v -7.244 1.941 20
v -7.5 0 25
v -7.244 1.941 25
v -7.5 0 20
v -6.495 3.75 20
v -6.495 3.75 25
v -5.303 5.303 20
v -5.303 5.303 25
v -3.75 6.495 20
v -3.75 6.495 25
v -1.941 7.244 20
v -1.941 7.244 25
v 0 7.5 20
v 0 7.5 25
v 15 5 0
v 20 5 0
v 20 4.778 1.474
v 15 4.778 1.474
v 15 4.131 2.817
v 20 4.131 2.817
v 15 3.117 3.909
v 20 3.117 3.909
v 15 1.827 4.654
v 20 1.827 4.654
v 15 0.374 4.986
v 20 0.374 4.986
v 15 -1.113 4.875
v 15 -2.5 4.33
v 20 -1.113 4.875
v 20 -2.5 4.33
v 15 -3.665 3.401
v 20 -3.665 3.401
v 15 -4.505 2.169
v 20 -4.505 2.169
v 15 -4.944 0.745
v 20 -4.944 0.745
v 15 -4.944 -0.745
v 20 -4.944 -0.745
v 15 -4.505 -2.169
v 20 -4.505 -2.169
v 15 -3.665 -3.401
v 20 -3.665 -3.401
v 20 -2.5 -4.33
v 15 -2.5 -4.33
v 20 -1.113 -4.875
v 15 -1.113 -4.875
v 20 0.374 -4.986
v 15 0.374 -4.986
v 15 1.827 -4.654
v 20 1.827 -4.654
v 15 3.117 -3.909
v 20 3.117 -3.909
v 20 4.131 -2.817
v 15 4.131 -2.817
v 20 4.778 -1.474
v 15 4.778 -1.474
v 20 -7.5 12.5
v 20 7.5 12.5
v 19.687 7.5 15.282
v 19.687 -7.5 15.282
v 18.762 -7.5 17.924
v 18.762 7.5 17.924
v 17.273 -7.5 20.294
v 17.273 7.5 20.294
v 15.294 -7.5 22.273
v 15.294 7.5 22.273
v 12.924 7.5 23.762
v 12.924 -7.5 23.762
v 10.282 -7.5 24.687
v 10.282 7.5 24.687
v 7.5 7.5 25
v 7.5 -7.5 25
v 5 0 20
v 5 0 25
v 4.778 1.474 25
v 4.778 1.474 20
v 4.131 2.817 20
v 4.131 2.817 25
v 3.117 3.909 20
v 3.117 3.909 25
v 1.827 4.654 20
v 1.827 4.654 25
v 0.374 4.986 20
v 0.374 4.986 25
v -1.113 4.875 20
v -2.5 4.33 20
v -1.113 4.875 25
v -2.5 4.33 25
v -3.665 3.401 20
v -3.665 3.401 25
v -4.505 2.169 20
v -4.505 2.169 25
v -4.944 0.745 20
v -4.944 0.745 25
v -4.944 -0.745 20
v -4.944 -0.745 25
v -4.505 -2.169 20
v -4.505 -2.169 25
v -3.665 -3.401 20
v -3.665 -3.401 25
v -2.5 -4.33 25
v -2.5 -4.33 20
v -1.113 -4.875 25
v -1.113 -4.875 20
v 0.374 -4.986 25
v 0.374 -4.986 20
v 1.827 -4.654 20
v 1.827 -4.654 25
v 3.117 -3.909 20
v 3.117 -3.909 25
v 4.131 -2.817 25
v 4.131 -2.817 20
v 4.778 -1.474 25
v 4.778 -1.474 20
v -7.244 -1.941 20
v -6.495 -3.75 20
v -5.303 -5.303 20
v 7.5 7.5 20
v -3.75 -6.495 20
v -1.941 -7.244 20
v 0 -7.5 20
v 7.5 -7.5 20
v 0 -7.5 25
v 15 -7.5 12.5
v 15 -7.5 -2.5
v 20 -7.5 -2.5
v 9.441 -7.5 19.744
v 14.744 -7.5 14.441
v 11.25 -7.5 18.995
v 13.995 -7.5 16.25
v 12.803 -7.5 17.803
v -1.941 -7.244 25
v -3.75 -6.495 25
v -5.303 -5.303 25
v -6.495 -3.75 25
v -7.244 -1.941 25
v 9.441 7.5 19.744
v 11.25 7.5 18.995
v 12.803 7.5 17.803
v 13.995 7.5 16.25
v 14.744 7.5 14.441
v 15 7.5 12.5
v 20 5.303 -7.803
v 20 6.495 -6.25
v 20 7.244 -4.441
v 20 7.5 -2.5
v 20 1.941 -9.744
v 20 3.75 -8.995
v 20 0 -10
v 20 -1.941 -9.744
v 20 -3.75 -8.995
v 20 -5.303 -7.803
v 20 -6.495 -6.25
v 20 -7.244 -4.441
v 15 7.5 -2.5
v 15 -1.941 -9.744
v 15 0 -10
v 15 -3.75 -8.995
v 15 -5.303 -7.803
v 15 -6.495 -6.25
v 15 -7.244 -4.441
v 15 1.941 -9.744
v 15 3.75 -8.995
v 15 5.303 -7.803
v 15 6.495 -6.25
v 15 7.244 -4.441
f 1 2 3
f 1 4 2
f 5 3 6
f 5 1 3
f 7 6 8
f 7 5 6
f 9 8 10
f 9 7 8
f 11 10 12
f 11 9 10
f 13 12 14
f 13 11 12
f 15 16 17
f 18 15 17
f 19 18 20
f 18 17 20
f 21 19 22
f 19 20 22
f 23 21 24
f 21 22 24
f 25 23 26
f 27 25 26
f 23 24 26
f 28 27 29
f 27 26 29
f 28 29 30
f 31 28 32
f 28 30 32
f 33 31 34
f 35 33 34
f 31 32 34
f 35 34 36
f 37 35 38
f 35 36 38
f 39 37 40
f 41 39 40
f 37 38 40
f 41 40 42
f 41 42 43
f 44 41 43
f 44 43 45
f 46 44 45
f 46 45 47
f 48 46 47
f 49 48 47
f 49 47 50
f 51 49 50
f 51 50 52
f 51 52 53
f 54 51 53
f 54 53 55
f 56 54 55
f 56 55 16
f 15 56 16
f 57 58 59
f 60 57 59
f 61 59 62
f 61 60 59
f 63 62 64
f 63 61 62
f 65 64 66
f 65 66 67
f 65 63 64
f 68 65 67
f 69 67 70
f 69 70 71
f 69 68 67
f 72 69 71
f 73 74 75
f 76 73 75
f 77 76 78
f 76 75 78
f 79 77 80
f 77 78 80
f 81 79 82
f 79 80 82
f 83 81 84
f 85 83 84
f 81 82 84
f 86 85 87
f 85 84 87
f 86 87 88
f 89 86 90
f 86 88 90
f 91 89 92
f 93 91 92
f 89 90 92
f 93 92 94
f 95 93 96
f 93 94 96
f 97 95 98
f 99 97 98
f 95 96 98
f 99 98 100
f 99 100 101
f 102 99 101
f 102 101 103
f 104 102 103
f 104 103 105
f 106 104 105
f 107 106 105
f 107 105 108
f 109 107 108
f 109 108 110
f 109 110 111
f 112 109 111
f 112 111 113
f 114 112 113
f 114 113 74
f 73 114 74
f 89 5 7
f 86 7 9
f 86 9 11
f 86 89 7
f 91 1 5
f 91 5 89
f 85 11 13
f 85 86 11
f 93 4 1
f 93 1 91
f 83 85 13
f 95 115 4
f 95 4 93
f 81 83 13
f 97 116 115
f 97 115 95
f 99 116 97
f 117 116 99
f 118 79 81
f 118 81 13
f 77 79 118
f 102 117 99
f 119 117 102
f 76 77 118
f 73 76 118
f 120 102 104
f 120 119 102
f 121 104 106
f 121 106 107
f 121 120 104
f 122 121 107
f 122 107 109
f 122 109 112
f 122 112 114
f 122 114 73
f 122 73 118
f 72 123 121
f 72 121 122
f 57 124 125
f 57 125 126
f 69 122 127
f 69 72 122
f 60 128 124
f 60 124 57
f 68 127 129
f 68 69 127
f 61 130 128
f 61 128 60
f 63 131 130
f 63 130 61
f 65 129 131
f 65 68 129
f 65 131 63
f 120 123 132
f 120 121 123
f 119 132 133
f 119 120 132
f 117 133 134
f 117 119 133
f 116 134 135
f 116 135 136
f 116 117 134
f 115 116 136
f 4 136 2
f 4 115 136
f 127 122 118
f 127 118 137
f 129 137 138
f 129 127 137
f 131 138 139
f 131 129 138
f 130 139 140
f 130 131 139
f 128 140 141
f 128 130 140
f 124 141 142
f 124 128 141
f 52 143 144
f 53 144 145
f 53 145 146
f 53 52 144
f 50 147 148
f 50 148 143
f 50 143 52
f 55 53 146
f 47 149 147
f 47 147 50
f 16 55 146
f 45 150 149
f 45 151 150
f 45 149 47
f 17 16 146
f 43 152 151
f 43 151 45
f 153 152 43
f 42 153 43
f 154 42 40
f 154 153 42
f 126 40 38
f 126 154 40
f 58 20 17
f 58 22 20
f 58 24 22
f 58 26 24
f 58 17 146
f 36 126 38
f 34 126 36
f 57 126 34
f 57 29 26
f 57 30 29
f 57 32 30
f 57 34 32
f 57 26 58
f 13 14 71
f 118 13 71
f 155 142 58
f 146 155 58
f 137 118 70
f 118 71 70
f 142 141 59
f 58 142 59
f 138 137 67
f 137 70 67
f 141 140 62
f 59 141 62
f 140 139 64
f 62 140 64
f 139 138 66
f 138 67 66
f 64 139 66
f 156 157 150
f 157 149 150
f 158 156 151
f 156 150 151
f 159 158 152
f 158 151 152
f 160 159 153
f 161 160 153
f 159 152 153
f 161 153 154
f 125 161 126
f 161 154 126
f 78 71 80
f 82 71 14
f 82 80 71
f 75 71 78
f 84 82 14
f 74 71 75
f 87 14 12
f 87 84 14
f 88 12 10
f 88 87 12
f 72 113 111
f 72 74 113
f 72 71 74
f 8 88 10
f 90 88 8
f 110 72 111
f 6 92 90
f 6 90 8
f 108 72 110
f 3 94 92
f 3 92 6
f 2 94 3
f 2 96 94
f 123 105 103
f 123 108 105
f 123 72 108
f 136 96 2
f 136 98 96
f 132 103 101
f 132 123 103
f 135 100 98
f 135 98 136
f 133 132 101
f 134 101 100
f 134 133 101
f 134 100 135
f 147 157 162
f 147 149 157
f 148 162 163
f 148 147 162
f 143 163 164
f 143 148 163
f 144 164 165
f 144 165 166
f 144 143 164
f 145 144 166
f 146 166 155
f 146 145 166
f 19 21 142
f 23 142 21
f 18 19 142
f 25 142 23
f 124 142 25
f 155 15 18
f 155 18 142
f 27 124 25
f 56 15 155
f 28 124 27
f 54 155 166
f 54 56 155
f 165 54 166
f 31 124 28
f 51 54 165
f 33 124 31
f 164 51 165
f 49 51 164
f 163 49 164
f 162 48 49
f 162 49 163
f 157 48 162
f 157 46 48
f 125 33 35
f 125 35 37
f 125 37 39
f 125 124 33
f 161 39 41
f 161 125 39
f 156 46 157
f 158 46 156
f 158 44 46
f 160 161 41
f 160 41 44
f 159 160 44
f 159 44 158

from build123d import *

# Parameters (mm, degrees)
F1_DEPTH = 7.5
F2_R     = 7.49999
F3_R     = 5
F4_DEPTH = 35.001
F5_R     = 5
F6_DEPTH = 27.501


# Not quite as in the source:
# - a fillet or chamfer is up to 0.001 mm smaller than in the source, because OpenCascade refuses the exact size


with BuildPart() as f1:
    # F0 (on Front) → F1 (new body, symmetric)
    with BuildSketch(Plane.XZ):
        with BuildLine():
            Line((7.5, 25), (-7.5, 25))
            Line((-7.5, 25), (-7.5, 20))
            Line((-7.5, 20), (7.5, 20))
            ThreePointArc((7.5, 20), (12.8033008589, 17.8033008589), (15, 12.5))
            Line((15, 12.5), (15, -10))
            Line((15, -10), (20, -10))
            Line((20, -10), (20, 12.5))
            ThreePointArc((20, 12.5), (16.3388347648, 21.3388347648), (7.5, 25))
        make_face()
    extrude(amount=F1_DEPTH, both=True)

    # F2 (radius 7.5 in the source; OpenCascade refuses exactly that, so slightly less here)
    f2_edges = [f1.edges().sort_by_distance(p)[0] for p in [
        (-7.5, -7.5, 22.5),
        (-7.5, 7.5, 22.5),
        (17.5, -7.5, -10),
        (17.5, 7.5, -10),
    ]]
    fillet(f2_edges, radius=F2_R)

    # F3 (on face) → F4 (cut, through all)
    with BuildSketch(Plane.XY.offset(25)):
        Circle(F3_R)
    extrude(amount=-F4_DEPTH, mode=Mode.SUBTRACT)

    # F5 (on face) → F6 (cut, through all)
    with BuildSketch(Plane.YZ.offset(20)):
        Circle(F5_R)
    extrude(amount=-F6_DEPTH, mode=Mode.SUBTRACT)


solid = f1.part
